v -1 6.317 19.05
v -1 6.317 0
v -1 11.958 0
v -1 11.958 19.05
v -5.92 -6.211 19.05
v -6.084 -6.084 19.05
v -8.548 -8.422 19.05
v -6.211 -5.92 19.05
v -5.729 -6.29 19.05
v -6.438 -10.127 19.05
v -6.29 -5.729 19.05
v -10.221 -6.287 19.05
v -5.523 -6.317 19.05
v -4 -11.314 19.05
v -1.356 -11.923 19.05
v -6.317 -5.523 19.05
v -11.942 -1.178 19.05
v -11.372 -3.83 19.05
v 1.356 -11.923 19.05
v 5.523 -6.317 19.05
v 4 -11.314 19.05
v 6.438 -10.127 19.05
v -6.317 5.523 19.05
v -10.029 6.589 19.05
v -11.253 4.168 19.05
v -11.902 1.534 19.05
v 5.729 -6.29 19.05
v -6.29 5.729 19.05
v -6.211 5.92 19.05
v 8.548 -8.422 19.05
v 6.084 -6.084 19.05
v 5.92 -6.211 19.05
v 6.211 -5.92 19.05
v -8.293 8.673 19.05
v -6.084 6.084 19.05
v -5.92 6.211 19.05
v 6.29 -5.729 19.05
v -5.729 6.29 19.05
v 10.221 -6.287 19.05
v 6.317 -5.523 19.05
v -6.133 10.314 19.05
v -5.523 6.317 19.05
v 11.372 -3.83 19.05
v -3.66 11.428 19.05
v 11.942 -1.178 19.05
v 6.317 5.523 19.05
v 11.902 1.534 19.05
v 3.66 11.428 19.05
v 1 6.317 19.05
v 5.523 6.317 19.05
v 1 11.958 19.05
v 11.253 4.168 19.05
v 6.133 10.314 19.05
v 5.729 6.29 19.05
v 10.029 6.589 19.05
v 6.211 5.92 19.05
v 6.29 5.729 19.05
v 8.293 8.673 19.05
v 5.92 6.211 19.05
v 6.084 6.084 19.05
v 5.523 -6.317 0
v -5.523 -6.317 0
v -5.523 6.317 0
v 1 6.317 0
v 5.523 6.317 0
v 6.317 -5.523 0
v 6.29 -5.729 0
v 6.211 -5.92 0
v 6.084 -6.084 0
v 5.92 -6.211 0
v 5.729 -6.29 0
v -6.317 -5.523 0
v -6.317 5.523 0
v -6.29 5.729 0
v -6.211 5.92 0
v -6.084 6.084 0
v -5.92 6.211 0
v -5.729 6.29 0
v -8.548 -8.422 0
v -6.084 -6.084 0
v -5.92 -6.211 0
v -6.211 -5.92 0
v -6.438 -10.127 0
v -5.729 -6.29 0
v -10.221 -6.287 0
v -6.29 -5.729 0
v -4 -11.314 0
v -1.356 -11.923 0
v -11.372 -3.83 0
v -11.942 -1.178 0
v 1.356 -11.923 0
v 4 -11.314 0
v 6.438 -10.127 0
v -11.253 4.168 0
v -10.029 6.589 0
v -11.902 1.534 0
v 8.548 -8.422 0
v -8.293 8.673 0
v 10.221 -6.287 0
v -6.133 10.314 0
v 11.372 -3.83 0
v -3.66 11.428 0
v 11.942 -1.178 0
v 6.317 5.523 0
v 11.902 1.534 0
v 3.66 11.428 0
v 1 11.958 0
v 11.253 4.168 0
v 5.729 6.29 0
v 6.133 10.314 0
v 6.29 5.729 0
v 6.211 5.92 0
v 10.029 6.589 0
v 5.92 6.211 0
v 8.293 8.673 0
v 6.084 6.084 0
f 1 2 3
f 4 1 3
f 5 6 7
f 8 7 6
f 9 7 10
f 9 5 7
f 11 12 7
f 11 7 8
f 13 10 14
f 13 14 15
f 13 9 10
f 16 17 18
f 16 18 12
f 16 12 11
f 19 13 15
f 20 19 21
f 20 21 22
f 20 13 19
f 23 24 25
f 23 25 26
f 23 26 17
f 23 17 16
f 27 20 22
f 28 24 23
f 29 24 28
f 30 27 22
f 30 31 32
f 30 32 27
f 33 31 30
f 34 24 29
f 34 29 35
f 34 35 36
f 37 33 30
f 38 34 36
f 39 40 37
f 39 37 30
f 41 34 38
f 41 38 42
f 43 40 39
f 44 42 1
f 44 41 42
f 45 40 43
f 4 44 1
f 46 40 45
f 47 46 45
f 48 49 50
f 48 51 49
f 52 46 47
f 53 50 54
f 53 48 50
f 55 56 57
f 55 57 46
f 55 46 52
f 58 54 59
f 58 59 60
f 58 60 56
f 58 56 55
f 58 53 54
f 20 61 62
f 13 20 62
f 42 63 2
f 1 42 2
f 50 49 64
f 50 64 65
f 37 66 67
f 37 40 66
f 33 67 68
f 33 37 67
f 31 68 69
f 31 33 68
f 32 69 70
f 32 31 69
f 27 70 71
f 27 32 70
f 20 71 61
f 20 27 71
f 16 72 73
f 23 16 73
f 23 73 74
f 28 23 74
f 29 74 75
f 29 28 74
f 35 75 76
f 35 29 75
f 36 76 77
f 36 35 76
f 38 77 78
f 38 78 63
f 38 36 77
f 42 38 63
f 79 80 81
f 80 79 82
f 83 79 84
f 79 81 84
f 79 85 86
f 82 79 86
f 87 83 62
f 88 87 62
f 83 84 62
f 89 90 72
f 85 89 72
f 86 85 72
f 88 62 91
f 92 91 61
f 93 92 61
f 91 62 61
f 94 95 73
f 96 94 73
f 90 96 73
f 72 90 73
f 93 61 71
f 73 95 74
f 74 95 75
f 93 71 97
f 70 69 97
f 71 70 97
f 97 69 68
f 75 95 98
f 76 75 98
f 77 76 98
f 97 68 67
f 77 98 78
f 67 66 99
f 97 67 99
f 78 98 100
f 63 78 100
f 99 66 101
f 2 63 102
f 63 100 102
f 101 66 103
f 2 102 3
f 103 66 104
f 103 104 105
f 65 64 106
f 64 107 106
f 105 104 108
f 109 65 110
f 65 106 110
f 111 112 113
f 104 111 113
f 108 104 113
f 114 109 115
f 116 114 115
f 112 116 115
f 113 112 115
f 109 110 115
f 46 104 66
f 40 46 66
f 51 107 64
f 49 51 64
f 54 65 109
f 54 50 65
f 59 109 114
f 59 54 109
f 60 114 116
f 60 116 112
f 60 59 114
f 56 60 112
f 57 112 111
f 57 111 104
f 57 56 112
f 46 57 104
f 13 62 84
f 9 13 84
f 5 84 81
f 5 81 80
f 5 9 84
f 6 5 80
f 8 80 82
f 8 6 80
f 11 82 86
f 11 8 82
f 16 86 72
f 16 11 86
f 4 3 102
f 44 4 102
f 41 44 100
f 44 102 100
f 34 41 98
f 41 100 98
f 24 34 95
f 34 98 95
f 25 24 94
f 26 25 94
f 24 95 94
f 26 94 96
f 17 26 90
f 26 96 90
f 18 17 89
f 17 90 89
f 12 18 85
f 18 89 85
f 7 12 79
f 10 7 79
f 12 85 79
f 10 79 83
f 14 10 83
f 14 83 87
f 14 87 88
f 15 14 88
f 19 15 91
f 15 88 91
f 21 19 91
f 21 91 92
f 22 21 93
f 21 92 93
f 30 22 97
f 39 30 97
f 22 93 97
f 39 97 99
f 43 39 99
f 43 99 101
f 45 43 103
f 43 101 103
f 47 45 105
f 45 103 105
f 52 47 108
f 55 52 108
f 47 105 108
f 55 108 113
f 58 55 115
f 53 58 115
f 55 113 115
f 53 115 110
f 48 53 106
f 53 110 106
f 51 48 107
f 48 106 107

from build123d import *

# Parameters (mm, degrees)
F1_DEPTH = 19.05
F2_R     = 0.79375


with BuildPart() as f1:
    # F0 (on Top) → F1 (new body)
    with BuildSketch(Plane.XY):
        with BuildLine():
            Line((-1, 6.316894), (-1, 11.958261))
            ThreePointArc((-1, 11.958261), (0, -12), (1, 11.958261))
            Line((1, 11.958261), (1, 6.316894))
            Line((1, 6.316894), (6.316894, 6.316894))
            Line((6.316894, 6.316894), (6.316894, -6.316894))
            Line((6.316894, -6.316894), (-6.316894, -6.316894))
            Line((-6.316894, -6.316894), (-6.316894, 6.316894))
            Line((-6.316894, 6.316894), (-1, 6.316894))
        make_face()
    extrude(amount=F1_DEPTH)

    # F2
    f2_edges = [f1.edges().sort_by_distance(p)[0] for p in [
        (-6.316894, 6.316894, 9.525),
        (6.316894, 6.316894, 9.525),
        (6.316894, -6.316894, 9.525),
        (-6.316894, -6.316894, 9.525),
    ]]
    fillet(f2_edges, radius=F2_R)


solid = f1.part
